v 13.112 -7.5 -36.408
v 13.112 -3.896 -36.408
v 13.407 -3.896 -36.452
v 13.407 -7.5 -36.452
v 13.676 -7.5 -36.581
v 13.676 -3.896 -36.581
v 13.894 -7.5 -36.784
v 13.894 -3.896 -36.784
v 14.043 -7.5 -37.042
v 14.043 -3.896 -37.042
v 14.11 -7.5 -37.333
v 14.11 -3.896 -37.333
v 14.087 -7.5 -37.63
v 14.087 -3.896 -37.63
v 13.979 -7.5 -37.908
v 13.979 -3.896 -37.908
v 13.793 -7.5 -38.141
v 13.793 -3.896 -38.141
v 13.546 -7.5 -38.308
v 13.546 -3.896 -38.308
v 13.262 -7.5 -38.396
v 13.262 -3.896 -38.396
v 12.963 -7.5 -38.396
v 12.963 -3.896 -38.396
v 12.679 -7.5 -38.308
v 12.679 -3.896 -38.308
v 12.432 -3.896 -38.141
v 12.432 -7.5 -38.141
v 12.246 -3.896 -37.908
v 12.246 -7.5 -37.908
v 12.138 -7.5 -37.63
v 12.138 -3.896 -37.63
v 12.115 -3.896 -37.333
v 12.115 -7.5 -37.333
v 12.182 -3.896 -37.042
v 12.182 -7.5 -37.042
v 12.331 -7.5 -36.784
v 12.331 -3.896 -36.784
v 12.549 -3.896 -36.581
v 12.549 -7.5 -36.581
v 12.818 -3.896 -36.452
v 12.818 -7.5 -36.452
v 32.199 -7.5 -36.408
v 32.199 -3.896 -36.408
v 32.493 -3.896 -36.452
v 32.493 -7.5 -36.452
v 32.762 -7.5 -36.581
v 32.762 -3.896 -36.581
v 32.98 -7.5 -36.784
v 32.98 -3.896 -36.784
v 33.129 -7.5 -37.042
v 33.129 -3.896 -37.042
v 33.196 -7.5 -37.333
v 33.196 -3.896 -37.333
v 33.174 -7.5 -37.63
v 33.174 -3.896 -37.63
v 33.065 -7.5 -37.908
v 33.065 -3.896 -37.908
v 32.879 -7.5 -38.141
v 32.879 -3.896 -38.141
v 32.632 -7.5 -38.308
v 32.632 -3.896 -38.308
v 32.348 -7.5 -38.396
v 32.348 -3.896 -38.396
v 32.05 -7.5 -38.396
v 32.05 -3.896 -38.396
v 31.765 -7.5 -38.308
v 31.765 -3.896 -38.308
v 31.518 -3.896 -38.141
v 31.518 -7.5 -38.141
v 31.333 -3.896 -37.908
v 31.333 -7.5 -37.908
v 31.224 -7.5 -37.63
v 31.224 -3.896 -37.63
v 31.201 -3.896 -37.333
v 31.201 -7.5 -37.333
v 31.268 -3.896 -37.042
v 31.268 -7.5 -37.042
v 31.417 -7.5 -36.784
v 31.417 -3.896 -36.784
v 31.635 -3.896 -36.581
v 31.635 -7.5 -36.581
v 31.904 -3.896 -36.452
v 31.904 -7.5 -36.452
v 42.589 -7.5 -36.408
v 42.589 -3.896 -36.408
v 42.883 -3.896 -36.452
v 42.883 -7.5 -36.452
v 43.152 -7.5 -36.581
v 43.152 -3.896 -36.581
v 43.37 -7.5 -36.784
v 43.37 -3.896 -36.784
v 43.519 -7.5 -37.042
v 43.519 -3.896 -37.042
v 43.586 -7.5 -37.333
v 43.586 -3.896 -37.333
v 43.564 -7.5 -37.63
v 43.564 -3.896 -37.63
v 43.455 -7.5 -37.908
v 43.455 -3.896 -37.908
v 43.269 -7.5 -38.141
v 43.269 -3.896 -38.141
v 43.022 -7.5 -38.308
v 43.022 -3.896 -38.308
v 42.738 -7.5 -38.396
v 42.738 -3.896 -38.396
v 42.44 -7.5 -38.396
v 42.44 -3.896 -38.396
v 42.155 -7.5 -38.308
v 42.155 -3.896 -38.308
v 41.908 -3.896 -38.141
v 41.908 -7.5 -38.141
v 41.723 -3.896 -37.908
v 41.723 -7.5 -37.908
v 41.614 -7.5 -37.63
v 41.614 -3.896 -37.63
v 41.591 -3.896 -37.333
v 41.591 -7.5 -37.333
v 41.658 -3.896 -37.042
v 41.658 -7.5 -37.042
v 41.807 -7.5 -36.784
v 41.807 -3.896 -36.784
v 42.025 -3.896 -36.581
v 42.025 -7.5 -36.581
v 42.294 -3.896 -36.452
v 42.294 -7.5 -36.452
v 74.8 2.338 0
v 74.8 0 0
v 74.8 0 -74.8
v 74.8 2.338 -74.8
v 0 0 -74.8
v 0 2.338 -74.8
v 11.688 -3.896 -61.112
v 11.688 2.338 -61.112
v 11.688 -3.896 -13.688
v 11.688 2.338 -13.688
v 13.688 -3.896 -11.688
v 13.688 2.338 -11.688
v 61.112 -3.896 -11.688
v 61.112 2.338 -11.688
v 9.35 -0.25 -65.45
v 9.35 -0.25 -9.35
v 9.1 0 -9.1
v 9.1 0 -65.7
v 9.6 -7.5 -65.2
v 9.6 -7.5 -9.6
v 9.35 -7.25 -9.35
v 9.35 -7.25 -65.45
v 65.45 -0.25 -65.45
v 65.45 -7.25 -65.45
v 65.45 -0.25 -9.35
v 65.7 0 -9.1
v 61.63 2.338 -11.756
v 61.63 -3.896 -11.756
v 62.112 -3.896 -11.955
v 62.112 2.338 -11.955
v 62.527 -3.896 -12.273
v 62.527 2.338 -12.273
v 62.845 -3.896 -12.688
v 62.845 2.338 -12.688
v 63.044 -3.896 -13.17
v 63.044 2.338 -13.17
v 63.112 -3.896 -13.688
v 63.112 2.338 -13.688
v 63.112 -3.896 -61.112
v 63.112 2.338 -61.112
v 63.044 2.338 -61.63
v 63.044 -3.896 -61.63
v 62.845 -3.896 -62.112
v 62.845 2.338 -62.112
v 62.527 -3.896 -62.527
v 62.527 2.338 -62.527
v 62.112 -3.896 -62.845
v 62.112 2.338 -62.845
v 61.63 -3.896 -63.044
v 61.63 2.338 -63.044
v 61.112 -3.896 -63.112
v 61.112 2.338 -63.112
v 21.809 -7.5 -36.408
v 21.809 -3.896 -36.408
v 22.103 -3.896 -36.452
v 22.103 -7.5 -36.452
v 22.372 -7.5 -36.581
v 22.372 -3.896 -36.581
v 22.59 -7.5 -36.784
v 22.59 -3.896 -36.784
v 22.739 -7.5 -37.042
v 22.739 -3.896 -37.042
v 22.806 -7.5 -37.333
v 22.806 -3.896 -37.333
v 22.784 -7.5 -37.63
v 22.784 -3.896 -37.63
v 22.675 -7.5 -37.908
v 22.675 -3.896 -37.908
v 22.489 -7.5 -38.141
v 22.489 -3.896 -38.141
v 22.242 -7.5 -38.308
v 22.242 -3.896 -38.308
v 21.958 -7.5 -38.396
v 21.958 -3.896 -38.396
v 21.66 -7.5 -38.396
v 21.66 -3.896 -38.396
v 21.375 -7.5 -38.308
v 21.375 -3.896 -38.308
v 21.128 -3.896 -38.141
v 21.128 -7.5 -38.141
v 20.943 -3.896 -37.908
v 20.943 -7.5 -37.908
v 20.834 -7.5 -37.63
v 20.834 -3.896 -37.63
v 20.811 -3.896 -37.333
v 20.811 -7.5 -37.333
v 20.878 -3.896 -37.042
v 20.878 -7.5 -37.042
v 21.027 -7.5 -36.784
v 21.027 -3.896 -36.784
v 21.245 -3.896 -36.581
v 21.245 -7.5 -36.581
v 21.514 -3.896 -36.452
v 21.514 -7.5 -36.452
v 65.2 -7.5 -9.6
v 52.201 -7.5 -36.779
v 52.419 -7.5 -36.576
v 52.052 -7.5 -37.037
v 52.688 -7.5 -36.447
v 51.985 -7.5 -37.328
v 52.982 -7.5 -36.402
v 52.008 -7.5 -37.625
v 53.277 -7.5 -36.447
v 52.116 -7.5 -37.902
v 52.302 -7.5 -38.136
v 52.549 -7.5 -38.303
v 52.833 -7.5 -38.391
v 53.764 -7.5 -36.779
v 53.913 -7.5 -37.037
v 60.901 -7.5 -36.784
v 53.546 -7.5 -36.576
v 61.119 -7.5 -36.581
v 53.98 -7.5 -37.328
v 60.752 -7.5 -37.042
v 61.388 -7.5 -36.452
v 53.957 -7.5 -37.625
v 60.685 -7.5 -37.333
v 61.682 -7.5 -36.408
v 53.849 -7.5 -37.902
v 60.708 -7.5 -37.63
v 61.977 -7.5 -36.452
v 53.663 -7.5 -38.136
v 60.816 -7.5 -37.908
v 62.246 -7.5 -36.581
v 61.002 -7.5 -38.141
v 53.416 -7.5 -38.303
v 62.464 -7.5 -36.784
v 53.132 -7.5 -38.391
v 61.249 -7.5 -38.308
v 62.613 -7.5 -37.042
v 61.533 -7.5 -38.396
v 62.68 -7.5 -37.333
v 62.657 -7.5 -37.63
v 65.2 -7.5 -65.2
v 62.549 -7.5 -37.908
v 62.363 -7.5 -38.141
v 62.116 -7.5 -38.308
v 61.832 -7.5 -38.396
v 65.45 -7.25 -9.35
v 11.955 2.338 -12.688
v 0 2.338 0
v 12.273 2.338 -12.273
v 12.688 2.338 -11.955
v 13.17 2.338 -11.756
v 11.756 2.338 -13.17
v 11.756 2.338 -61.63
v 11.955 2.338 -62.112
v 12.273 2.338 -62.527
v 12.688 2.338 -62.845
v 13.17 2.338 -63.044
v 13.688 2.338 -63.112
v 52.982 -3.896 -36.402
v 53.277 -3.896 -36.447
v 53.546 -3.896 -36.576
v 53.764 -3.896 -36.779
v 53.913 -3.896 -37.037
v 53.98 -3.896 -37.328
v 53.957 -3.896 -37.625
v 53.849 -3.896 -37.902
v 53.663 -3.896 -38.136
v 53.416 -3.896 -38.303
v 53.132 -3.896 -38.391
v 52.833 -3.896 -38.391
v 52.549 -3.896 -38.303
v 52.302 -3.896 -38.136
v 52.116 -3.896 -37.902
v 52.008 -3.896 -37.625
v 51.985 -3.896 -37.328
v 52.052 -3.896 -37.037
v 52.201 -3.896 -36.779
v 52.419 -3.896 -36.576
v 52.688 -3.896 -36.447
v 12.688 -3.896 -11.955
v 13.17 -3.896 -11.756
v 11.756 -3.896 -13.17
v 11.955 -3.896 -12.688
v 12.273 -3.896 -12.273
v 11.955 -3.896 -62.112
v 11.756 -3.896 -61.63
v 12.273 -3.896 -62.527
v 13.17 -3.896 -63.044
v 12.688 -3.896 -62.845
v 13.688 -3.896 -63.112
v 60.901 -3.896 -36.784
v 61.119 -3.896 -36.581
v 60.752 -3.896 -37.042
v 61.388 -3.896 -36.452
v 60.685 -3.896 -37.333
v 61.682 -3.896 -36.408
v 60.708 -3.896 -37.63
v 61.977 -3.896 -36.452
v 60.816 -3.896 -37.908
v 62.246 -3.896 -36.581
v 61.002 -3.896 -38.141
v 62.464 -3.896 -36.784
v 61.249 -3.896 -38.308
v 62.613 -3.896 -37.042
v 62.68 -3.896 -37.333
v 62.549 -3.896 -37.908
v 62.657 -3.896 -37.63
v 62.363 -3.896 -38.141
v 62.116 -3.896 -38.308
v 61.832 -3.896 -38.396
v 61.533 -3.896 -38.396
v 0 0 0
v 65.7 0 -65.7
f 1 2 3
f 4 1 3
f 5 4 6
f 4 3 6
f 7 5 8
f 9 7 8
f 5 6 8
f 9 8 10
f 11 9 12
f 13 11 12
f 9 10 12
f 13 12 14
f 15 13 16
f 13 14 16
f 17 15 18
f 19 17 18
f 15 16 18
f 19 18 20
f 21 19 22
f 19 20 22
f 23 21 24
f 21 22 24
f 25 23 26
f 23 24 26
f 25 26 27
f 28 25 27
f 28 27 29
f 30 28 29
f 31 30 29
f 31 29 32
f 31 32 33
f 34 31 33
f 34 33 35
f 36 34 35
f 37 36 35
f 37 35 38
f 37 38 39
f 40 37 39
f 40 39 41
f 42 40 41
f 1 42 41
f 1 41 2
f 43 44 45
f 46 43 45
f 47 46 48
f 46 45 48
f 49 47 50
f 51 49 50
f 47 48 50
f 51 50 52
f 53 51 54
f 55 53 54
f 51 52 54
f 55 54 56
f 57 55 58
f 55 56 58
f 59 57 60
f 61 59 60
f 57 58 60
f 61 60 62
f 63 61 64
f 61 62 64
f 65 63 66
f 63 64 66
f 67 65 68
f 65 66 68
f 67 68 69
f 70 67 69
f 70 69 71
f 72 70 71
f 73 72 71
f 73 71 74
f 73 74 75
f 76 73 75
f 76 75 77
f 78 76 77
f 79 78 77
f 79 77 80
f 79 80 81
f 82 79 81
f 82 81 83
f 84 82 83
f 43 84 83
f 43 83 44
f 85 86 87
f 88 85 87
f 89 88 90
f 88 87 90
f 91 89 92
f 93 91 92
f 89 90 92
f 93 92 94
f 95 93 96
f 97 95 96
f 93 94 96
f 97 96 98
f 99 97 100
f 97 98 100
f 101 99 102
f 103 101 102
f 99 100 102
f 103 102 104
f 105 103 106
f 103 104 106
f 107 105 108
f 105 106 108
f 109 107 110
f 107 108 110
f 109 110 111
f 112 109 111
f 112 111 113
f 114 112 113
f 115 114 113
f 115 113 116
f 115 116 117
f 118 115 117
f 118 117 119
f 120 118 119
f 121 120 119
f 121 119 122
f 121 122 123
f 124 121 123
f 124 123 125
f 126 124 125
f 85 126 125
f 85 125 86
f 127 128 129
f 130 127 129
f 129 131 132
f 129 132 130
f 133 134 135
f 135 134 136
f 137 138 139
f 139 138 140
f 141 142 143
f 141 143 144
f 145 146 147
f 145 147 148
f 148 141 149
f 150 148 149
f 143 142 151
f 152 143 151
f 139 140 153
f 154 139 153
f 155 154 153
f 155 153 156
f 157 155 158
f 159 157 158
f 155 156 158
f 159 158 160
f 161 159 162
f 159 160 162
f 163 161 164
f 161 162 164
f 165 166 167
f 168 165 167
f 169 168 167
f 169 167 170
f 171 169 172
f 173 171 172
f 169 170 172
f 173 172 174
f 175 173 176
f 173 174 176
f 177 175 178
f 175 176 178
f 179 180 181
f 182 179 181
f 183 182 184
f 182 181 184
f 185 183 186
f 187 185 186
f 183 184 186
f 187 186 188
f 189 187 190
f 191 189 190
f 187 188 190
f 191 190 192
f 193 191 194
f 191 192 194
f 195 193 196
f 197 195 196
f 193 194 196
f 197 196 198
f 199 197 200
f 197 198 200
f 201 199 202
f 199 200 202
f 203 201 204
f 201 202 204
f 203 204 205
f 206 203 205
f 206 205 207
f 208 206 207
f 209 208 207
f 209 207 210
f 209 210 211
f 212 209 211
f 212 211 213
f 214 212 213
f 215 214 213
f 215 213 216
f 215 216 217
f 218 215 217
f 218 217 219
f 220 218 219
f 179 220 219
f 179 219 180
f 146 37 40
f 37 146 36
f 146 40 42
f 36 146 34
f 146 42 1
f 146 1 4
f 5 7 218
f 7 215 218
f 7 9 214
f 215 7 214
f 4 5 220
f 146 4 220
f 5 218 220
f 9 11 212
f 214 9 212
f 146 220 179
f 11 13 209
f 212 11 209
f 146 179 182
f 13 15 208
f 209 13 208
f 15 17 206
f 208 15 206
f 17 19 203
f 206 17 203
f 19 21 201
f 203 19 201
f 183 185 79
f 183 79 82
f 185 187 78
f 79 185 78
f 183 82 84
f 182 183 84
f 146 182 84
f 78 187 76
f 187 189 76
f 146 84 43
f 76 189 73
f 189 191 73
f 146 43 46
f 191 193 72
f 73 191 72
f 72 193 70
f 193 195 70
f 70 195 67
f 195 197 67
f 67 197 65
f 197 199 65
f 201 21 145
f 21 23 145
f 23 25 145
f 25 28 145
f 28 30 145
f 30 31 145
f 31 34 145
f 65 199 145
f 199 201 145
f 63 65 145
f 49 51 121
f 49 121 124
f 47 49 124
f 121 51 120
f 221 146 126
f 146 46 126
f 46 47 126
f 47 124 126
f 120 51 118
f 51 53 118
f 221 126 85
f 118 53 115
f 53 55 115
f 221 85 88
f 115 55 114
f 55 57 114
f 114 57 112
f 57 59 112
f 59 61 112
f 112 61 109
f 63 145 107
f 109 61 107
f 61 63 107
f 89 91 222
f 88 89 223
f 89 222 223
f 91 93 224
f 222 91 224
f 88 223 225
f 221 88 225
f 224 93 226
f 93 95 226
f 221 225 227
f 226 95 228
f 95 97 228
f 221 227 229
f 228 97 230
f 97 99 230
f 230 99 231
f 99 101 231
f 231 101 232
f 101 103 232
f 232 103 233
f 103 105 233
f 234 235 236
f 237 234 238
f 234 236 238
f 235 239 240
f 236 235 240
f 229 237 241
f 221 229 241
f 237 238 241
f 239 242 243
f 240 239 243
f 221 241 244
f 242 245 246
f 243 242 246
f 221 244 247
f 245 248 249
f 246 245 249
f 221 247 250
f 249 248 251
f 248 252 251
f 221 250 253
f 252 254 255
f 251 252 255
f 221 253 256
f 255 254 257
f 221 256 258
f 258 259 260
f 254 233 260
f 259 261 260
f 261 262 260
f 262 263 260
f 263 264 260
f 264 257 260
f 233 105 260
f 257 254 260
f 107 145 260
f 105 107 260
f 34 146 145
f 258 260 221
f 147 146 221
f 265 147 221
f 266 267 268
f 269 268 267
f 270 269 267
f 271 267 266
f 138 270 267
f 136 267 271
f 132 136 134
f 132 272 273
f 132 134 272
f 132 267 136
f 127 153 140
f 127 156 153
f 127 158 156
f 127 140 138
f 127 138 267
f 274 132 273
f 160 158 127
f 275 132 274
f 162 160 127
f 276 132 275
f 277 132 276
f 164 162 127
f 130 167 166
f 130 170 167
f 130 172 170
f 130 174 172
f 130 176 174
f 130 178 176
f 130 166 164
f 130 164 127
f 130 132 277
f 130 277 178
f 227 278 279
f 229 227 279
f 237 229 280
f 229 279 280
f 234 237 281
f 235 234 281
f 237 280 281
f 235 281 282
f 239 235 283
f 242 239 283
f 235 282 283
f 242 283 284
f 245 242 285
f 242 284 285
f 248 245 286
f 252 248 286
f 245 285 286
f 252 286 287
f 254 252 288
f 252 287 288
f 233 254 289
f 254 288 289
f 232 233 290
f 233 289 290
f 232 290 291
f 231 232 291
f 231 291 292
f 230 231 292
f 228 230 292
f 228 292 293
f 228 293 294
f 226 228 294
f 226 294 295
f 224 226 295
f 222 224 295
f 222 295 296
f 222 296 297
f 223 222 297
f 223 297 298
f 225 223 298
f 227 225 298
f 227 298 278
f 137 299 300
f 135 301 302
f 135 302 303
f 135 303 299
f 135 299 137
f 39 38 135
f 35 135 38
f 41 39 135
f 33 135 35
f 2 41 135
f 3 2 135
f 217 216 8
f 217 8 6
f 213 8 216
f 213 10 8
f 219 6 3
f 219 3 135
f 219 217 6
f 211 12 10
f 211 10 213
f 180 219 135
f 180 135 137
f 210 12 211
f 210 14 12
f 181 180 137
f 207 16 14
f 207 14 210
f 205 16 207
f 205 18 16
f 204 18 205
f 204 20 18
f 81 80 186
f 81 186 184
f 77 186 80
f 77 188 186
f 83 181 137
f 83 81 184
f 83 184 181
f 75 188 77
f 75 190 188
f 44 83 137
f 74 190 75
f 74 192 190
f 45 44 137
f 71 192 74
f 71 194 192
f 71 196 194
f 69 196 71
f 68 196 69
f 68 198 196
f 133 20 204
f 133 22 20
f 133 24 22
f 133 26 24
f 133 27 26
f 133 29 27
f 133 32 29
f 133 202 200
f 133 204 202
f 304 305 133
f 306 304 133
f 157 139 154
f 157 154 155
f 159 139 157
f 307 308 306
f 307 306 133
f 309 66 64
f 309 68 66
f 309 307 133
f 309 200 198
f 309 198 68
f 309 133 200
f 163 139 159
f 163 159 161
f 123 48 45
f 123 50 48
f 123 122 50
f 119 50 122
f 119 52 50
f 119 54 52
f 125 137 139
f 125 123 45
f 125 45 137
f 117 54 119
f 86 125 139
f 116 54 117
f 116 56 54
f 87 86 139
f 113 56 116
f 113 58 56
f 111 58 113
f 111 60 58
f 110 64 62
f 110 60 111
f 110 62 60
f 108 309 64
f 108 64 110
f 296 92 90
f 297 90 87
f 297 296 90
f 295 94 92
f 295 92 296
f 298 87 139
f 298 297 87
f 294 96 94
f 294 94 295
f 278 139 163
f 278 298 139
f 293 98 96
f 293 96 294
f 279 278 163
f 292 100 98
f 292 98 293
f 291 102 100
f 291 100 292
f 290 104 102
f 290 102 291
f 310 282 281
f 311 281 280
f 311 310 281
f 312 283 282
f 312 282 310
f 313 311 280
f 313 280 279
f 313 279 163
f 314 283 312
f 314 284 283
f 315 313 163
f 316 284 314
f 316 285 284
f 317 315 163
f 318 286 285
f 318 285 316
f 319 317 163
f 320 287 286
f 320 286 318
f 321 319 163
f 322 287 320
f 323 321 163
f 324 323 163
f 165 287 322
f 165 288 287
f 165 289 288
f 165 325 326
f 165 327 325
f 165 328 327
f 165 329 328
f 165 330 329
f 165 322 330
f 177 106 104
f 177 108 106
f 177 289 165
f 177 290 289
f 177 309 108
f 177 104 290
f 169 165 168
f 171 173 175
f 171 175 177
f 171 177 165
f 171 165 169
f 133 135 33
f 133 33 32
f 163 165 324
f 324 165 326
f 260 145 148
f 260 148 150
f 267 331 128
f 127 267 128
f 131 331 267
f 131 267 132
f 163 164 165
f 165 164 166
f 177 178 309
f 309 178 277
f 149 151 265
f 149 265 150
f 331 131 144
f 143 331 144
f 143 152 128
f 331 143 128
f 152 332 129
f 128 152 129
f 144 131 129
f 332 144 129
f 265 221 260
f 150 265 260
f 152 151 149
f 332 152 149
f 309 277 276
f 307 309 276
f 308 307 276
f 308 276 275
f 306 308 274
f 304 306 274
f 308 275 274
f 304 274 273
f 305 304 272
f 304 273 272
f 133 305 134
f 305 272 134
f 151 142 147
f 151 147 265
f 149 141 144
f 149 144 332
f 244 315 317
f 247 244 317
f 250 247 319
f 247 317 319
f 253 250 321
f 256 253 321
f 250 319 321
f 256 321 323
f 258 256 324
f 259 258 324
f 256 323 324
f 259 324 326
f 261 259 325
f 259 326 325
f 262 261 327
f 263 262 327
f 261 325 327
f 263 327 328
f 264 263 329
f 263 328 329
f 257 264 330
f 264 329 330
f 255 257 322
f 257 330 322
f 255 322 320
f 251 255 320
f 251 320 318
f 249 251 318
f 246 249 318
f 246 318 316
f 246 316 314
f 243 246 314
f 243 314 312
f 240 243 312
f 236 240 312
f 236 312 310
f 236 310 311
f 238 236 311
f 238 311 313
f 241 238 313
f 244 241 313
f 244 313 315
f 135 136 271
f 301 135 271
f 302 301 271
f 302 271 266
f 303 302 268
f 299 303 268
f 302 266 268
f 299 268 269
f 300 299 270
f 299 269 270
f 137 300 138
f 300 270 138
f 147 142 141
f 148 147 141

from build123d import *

# Parameters (mm, degrees)
SKETCH1_W           = 74.8
SKETCH1_H           = 74.8
BOSS_EXTRUDE1_DEPTH = 2.3375
SKETCH2_W           = 56.1
SKETCH2_H           = 56.1
BOSS_EXTRUDE2_DEPTH = 7.5
CHAMFER1_SIZE       = 0.25
CUT_EXTRUDE1_DEPTH  = 6.233333333
SKETCH4_R           = 1
CUT_EXTRUDE2_DEPTH  = 4


with BuildPart() as part:
    # Sketch1 → Boss-Extrude1 (new body)
    with BuildSketch(Plane(origin=(0, 0, 0), x_dir=(1, 0, 0), z_dir=(0, 1, 0))):
        with Locations((37.4, 37.4)):
            Rectangle(SKETCH1_W, SKETCH1_H)
    extrude(amount=BOSS_EXTRUDE1_DEPTH)

    # Sketch2 → Boss-Extrude2 (add)
    with BuildSketch(Plane(origin=(0, 0, 0), x_dir=(1, 0, 0), z_dir=(0, 1, 0))):
        with Locations((37.4, 37.4)):
            Rectangle(SKETCH2_W, SKETCH2_H)
    extrude(amount=-BOSS_EXTRUDE2_DEPTH)

    # Chamfer1
    chamfer1_edges = [part.edges().sort_by_distance(p)[0] for p in [
        (9.35, -7.5, -37.4),
        (37.4, -7.5, -65.45),
        (65.45, -7.5, -37.4),
        (37.4, -7.5, -9.35),
        (9.35, 0, -37.4),
        (37.4, 0, -9.35),
        (65.45, 0, -37.4),
        (37.4, 0, -65.45),
    ]]
    chamfer(chamfer1_edges, length=CHAMFER1_SIZE)

    # Sketch3 → Cut-Extrude1 (cut)
    with BuildSketch(Plane(origin=(0, 2.3375, 0), x_dir=(1, 0, 0), z_dir=(0, 1, 0))):
        with BuildLine():
            Line((61.1125, 63.1125), (13.6875, 63.1125))
            ThreePointArc((13.6875, 63.1125), (12.273286438, 62.526713562), (11.6875, 61.1125))
            Line((11.6875, 61.1125), (11.6875, 13.6875))
            ThreePointArc((11.6875, 13.6875), (12.273286438, 12.273286438), (13.6875, 11.6875))
            Line((13.6875, 11.6875), (61.1125, 11.6875))
            ThreePointArc((61.1125, 11.6875), (62.526713562, 12.273286438), (63.1125, 13.6875))
            Line((63.1125, 13.6875), (63.1125, 61.1125))
            ThreePointArc((63.1125, 61.1125), (62.526713562, 62.526713562), (61.1125, 63.1125))
        make_face()
    extrude(amount=-CUT_EXTRUDE1_DEPTH, mode=Mode.SUBTRACT)

    # Sketch4 → Cut-Extrude2 (cut)
    with BuildSketch(Plane(origin=(0, -3.895833333, 0), x_dir=(1, 0, 0), z_dir=(0, 1, 0))):
        with Locations(Location((13.1125, 37.4075, 0), (0, 0, 270))):
            Circle(SKETCH4_R)
        with Locations(Location((21.808611106, 37.4075, 0), (0, 0, 270))):
            Circle(SKETCH4_R)
        with Locations(Location((32.198611106, 37.4075, 0), (0, 0, 270))):
            Circle(SKETCH4_R)
        with Locations(Location((42.588611106, 37.4075, 0), (0, 0, 270))):
            Circle(SKETCH4_R)
        with Locations(Location((52.982499988, 37.4025, 0), (0, 0, 270))):
            Circle(SKETCH4_R)
        with Locations(Location((61.6825, 37.4075, 0), (0, 0, 270))):
            Circle(SKETCH4_R)
    extrude(amount=-CUT_EXTRUDE2_DEPTH, mode=Mode.SUBTRACT)


solid = part.part
